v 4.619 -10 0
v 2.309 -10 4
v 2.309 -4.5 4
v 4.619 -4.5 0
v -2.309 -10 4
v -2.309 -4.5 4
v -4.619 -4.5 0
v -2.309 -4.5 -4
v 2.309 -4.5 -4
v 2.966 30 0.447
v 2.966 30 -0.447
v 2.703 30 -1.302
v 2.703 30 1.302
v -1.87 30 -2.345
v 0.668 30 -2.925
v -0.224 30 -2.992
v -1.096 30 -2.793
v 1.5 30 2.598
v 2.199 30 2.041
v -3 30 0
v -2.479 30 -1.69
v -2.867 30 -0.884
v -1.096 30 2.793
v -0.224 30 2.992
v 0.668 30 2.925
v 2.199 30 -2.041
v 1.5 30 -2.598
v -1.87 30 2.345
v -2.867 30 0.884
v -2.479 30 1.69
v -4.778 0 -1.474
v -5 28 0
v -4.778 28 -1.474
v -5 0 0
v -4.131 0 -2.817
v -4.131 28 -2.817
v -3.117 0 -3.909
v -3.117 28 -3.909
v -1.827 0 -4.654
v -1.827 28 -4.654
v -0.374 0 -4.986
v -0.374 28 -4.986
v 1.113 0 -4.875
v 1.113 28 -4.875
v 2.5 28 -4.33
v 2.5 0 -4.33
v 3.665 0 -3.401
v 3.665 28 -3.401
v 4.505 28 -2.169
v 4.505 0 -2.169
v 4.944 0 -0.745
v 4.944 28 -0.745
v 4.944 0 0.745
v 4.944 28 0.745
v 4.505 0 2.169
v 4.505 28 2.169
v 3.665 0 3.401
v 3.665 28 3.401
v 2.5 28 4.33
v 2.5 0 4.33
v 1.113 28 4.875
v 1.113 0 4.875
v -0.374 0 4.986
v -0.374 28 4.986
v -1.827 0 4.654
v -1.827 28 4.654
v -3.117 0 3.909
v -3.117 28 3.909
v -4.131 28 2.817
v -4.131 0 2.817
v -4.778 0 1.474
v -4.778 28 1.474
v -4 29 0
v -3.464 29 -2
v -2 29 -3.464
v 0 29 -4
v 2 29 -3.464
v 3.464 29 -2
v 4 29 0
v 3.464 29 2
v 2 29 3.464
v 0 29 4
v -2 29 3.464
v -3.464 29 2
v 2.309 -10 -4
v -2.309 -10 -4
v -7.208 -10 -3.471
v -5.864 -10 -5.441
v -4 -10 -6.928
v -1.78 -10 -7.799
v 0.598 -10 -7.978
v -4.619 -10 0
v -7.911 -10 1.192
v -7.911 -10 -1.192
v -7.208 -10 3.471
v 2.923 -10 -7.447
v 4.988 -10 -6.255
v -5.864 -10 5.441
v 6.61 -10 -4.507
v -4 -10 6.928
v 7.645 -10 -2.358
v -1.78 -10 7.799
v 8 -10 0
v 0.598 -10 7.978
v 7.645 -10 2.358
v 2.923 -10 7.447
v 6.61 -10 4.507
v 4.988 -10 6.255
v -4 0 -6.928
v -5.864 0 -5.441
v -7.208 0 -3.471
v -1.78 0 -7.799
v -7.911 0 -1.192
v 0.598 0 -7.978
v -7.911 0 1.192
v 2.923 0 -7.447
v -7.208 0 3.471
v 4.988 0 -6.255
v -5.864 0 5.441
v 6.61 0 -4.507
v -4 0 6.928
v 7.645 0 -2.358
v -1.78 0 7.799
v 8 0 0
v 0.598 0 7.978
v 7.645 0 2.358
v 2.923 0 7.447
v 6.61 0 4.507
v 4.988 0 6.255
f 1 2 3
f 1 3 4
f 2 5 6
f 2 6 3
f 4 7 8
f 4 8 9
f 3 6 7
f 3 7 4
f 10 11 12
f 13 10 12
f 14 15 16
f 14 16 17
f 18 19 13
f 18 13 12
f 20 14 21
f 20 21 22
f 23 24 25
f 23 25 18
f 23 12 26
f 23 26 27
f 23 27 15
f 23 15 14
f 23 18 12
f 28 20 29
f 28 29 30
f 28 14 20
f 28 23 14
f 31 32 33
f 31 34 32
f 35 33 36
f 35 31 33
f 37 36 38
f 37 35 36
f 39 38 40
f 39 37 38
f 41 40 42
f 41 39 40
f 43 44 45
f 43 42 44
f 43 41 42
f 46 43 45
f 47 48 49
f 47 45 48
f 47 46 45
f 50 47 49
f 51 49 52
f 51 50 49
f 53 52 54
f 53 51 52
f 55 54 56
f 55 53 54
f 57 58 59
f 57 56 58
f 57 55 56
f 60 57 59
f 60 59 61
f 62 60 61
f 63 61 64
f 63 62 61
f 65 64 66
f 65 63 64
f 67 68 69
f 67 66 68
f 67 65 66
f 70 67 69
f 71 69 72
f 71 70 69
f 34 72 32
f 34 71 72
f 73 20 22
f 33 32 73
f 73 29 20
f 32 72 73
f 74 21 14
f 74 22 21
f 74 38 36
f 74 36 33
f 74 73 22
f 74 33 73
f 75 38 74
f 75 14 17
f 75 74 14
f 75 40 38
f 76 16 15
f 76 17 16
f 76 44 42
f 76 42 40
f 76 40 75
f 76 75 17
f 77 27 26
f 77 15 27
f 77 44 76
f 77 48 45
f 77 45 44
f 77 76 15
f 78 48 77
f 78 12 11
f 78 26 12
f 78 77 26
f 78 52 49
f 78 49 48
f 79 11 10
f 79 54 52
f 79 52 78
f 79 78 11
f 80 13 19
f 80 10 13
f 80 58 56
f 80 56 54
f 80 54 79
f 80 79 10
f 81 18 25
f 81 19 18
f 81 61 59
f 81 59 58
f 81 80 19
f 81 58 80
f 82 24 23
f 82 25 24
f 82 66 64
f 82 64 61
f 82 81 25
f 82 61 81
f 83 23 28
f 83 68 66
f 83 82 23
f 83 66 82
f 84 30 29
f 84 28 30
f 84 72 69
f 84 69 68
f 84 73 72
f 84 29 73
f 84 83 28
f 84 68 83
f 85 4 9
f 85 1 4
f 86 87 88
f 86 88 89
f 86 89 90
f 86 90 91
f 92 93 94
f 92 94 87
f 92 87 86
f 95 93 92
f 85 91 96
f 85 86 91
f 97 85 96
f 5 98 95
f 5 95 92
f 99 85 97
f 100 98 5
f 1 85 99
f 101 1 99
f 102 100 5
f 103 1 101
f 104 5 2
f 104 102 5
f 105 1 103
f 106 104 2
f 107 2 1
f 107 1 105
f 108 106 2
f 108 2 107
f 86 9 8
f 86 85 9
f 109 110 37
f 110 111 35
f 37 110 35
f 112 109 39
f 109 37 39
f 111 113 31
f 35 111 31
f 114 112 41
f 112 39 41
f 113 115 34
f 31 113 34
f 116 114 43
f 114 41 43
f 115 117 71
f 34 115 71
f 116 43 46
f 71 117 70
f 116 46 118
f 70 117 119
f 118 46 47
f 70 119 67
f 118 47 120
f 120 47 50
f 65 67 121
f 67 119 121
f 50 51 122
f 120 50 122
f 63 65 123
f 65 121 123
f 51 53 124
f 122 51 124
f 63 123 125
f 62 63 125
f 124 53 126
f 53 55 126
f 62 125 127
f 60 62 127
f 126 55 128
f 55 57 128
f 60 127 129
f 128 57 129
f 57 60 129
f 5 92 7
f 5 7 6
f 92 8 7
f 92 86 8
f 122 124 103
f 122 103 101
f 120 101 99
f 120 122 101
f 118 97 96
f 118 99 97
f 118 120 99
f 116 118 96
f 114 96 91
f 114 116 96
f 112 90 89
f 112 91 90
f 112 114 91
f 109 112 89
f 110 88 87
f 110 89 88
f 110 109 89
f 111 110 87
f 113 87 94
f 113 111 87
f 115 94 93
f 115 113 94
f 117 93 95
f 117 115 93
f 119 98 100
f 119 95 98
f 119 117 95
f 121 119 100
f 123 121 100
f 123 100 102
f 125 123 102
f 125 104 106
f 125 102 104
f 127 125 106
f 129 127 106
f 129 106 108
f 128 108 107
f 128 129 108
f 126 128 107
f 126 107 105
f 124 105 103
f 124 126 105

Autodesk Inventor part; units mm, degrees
ref_plane "YZ Plane" through (0, 0, 0) normal (1, 0, 0) x (0, 1, 0)
ref_plane "XZ Plane" through (0, 0, 0) normal (0, 1, 0) x (-1, 0, 0)
ref_plane "XY Plane" through (0, 0, 0) normal (0, 0, 1) x (1, 0, 0)
sketch "스케치1" plane through (0, 0, 0) normal (0, 1, 0) x (-1, 0, 0)
  circle A0 centre (0, 0) radius 5
  dimension "d0" = 10
extrude "돌출1" add sketch "스케치1" along normal blind 30
sketch "스케치2" plane through (0, 0, 0) normal (0, -1, 0) x (1, 0, 0)
  circle A0 centre (0, 0) radius 8
  dimension "d3" = 16
extrude "돌출2" add sketch "스케치2" along normal blind 10
sketch "스케치3" plane through (0, -10, 0) normal (0, -1, 0) x (1, 0, 0)
  circle A0 centre (0, 0) radius 5 construction
  line L0 (4.6188, 0) -> (2.3094, -4)
  line L1 (2.3094, -4) -> (-2.3094, -4)
  line L2 (-2.3094, -4) -> (-4.6188, 0)
  line L3 (-4.6188, 0) -> (-2.3094, 4)
  line L4 (-2.3094, 4) -> (2.3094, 4)
  line L5 (2.3094, 4) -> (4.6188, 0)
  dimension "d6" = 8
extrude "돌출3" cut sketch "스케치3" against normal blind 5.5
chamfer "모따기1" distance 2 angle 45 1 edges at (5, 30, 0)
thread "스레드1" size "M10x1.5" class "6g" standard "ANSI Metric M Profile" full length
properties part number "나사 10파이 30mm"
